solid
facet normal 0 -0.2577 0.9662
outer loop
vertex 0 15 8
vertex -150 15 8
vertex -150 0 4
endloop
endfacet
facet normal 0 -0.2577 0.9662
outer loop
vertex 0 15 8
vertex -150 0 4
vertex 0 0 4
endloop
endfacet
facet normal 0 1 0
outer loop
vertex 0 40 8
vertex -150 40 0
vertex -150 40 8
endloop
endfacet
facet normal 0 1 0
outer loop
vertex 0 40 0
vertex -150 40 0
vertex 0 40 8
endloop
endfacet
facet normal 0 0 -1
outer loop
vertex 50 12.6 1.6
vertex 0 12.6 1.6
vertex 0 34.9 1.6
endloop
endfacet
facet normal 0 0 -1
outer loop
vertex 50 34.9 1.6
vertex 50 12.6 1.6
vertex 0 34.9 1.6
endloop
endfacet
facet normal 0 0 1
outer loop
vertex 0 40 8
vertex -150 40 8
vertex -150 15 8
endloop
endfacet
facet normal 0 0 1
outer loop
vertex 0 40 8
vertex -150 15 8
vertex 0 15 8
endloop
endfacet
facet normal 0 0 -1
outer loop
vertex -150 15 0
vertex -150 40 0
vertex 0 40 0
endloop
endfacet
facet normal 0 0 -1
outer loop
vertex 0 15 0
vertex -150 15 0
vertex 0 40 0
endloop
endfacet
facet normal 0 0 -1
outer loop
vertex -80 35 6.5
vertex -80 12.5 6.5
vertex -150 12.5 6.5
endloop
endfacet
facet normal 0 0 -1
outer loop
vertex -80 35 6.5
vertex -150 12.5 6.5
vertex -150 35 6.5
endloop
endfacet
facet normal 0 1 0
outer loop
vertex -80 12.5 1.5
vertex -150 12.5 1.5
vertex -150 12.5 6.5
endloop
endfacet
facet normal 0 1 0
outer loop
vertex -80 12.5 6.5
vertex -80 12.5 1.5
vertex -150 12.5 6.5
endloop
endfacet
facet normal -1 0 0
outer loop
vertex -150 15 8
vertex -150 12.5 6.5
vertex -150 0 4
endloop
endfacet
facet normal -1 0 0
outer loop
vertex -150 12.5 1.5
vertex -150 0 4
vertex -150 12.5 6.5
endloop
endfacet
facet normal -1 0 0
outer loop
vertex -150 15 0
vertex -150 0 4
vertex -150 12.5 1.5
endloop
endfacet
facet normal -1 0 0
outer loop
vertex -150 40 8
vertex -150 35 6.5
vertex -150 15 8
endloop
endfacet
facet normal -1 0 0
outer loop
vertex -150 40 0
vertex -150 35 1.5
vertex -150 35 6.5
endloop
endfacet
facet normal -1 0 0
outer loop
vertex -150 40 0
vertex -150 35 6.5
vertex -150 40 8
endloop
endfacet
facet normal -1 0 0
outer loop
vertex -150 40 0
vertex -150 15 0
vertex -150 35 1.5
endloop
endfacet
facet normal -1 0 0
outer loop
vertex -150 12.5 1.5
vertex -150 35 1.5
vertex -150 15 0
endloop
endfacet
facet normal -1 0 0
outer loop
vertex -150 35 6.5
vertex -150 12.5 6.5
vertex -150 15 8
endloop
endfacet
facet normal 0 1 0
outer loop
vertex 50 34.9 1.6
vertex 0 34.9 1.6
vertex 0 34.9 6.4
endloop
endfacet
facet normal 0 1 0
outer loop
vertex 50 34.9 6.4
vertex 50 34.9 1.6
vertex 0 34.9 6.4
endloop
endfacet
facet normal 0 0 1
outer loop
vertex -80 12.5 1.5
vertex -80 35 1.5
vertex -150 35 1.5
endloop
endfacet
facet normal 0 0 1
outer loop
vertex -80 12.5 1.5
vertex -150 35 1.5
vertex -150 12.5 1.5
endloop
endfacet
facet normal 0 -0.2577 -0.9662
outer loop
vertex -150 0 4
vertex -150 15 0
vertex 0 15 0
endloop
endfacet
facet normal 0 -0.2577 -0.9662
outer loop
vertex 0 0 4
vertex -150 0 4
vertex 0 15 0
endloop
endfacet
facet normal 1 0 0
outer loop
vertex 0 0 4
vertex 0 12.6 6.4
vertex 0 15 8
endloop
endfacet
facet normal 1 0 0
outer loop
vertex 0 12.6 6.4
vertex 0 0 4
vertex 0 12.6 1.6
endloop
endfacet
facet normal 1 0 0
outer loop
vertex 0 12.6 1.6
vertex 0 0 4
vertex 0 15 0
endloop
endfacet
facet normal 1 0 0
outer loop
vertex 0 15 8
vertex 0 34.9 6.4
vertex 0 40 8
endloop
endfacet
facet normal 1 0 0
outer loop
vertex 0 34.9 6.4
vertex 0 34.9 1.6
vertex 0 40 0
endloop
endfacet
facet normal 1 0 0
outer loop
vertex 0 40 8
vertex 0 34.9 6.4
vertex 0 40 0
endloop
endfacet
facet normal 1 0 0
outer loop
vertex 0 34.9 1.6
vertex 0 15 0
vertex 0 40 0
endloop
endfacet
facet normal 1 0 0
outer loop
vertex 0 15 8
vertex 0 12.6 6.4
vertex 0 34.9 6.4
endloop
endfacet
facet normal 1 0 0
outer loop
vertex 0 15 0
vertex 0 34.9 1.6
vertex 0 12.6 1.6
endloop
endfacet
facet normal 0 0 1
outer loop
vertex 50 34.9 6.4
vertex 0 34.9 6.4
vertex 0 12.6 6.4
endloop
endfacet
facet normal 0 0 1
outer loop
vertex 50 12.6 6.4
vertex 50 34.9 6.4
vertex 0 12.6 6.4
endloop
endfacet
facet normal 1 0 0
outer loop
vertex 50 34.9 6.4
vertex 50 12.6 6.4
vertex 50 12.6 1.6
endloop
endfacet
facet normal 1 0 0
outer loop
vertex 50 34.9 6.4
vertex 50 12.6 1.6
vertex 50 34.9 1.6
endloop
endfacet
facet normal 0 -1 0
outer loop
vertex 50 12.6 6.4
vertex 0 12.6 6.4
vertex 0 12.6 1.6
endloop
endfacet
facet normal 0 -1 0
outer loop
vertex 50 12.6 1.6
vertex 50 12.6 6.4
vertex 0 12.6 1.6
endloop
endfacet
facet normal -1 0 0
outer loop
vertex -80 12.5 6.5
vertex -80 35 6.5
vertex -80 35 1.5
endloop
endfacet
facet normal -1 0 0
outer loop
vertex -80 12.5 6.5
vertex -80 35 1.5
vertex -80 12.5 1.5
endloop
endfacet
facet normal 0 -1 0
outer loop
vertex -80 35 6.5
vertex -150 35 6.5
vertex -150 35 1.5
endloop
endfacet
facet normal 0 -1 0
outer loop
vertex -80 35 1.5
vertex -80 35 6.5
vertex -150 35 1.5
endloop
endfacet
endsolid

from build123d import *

# Parameters (mm, degrees)
F0_W     = 150
F0_H     = 40
F1_DEPTH = 8
F2_SIZE2 = 14.99999
F2_SIZE  = 3.99999
F4_DEPTH = 70
F6_DEPTH = 50


# Not quite as in the source:
# - a fillet or chamfer is up to 0.001 mm smaller than in the source, because OpenCascade refuses the exact size


with BuildPart() as f1:
    # F0 (on Top) → F1 (new body)
    with BuildSketch(Plane.XY):
        with Locations((-75, 20)):
            Rectangle(F0_W, F0_H)
    extrude(amount=F1_DEPTH)

    # F2 (size 4 and 15 in the source; OpenCascade refuses exactly that, so slightly less here)
    f2_edges = [f1.edges().sort_by_distance(p)[0] for p in [
        (-75, 0, 8),
        (-75, 0, 0),
    ]]
    f2_side = f1.faces().sort_by_distance((-75, 0, 4))[0]
    chamfer(f2_edges, length=F2_SIZE, length2=F2_SIZE2, reference=f2_side)

    # F3 (on face) → F4 (cut)
    with BuildSketch(Plane(origin=(-150, 0, 0), x_dir=(0, -1, 0), z_dir=(-1, 0, 0))):
        Polygon((-12.5, 1.5), (-12.5, 4), (-12.5, 6.5), (-35, 6.5), (-35, 1.5), align=None)
    extrude(amount=-F4_DEPTH, mode=Mode.SUBTRACT)

    # F5 (on face) → F6 (join)
    with BuildSketch(Plane.YZ):
        Polygon((12.6, 6.4), (12.6, 4), (12.6, 1.6), (34.9, 1.6), (34.9, 6.4), align=None)
    extrude(amount=F6_DEPTH)


solid = f1.part
